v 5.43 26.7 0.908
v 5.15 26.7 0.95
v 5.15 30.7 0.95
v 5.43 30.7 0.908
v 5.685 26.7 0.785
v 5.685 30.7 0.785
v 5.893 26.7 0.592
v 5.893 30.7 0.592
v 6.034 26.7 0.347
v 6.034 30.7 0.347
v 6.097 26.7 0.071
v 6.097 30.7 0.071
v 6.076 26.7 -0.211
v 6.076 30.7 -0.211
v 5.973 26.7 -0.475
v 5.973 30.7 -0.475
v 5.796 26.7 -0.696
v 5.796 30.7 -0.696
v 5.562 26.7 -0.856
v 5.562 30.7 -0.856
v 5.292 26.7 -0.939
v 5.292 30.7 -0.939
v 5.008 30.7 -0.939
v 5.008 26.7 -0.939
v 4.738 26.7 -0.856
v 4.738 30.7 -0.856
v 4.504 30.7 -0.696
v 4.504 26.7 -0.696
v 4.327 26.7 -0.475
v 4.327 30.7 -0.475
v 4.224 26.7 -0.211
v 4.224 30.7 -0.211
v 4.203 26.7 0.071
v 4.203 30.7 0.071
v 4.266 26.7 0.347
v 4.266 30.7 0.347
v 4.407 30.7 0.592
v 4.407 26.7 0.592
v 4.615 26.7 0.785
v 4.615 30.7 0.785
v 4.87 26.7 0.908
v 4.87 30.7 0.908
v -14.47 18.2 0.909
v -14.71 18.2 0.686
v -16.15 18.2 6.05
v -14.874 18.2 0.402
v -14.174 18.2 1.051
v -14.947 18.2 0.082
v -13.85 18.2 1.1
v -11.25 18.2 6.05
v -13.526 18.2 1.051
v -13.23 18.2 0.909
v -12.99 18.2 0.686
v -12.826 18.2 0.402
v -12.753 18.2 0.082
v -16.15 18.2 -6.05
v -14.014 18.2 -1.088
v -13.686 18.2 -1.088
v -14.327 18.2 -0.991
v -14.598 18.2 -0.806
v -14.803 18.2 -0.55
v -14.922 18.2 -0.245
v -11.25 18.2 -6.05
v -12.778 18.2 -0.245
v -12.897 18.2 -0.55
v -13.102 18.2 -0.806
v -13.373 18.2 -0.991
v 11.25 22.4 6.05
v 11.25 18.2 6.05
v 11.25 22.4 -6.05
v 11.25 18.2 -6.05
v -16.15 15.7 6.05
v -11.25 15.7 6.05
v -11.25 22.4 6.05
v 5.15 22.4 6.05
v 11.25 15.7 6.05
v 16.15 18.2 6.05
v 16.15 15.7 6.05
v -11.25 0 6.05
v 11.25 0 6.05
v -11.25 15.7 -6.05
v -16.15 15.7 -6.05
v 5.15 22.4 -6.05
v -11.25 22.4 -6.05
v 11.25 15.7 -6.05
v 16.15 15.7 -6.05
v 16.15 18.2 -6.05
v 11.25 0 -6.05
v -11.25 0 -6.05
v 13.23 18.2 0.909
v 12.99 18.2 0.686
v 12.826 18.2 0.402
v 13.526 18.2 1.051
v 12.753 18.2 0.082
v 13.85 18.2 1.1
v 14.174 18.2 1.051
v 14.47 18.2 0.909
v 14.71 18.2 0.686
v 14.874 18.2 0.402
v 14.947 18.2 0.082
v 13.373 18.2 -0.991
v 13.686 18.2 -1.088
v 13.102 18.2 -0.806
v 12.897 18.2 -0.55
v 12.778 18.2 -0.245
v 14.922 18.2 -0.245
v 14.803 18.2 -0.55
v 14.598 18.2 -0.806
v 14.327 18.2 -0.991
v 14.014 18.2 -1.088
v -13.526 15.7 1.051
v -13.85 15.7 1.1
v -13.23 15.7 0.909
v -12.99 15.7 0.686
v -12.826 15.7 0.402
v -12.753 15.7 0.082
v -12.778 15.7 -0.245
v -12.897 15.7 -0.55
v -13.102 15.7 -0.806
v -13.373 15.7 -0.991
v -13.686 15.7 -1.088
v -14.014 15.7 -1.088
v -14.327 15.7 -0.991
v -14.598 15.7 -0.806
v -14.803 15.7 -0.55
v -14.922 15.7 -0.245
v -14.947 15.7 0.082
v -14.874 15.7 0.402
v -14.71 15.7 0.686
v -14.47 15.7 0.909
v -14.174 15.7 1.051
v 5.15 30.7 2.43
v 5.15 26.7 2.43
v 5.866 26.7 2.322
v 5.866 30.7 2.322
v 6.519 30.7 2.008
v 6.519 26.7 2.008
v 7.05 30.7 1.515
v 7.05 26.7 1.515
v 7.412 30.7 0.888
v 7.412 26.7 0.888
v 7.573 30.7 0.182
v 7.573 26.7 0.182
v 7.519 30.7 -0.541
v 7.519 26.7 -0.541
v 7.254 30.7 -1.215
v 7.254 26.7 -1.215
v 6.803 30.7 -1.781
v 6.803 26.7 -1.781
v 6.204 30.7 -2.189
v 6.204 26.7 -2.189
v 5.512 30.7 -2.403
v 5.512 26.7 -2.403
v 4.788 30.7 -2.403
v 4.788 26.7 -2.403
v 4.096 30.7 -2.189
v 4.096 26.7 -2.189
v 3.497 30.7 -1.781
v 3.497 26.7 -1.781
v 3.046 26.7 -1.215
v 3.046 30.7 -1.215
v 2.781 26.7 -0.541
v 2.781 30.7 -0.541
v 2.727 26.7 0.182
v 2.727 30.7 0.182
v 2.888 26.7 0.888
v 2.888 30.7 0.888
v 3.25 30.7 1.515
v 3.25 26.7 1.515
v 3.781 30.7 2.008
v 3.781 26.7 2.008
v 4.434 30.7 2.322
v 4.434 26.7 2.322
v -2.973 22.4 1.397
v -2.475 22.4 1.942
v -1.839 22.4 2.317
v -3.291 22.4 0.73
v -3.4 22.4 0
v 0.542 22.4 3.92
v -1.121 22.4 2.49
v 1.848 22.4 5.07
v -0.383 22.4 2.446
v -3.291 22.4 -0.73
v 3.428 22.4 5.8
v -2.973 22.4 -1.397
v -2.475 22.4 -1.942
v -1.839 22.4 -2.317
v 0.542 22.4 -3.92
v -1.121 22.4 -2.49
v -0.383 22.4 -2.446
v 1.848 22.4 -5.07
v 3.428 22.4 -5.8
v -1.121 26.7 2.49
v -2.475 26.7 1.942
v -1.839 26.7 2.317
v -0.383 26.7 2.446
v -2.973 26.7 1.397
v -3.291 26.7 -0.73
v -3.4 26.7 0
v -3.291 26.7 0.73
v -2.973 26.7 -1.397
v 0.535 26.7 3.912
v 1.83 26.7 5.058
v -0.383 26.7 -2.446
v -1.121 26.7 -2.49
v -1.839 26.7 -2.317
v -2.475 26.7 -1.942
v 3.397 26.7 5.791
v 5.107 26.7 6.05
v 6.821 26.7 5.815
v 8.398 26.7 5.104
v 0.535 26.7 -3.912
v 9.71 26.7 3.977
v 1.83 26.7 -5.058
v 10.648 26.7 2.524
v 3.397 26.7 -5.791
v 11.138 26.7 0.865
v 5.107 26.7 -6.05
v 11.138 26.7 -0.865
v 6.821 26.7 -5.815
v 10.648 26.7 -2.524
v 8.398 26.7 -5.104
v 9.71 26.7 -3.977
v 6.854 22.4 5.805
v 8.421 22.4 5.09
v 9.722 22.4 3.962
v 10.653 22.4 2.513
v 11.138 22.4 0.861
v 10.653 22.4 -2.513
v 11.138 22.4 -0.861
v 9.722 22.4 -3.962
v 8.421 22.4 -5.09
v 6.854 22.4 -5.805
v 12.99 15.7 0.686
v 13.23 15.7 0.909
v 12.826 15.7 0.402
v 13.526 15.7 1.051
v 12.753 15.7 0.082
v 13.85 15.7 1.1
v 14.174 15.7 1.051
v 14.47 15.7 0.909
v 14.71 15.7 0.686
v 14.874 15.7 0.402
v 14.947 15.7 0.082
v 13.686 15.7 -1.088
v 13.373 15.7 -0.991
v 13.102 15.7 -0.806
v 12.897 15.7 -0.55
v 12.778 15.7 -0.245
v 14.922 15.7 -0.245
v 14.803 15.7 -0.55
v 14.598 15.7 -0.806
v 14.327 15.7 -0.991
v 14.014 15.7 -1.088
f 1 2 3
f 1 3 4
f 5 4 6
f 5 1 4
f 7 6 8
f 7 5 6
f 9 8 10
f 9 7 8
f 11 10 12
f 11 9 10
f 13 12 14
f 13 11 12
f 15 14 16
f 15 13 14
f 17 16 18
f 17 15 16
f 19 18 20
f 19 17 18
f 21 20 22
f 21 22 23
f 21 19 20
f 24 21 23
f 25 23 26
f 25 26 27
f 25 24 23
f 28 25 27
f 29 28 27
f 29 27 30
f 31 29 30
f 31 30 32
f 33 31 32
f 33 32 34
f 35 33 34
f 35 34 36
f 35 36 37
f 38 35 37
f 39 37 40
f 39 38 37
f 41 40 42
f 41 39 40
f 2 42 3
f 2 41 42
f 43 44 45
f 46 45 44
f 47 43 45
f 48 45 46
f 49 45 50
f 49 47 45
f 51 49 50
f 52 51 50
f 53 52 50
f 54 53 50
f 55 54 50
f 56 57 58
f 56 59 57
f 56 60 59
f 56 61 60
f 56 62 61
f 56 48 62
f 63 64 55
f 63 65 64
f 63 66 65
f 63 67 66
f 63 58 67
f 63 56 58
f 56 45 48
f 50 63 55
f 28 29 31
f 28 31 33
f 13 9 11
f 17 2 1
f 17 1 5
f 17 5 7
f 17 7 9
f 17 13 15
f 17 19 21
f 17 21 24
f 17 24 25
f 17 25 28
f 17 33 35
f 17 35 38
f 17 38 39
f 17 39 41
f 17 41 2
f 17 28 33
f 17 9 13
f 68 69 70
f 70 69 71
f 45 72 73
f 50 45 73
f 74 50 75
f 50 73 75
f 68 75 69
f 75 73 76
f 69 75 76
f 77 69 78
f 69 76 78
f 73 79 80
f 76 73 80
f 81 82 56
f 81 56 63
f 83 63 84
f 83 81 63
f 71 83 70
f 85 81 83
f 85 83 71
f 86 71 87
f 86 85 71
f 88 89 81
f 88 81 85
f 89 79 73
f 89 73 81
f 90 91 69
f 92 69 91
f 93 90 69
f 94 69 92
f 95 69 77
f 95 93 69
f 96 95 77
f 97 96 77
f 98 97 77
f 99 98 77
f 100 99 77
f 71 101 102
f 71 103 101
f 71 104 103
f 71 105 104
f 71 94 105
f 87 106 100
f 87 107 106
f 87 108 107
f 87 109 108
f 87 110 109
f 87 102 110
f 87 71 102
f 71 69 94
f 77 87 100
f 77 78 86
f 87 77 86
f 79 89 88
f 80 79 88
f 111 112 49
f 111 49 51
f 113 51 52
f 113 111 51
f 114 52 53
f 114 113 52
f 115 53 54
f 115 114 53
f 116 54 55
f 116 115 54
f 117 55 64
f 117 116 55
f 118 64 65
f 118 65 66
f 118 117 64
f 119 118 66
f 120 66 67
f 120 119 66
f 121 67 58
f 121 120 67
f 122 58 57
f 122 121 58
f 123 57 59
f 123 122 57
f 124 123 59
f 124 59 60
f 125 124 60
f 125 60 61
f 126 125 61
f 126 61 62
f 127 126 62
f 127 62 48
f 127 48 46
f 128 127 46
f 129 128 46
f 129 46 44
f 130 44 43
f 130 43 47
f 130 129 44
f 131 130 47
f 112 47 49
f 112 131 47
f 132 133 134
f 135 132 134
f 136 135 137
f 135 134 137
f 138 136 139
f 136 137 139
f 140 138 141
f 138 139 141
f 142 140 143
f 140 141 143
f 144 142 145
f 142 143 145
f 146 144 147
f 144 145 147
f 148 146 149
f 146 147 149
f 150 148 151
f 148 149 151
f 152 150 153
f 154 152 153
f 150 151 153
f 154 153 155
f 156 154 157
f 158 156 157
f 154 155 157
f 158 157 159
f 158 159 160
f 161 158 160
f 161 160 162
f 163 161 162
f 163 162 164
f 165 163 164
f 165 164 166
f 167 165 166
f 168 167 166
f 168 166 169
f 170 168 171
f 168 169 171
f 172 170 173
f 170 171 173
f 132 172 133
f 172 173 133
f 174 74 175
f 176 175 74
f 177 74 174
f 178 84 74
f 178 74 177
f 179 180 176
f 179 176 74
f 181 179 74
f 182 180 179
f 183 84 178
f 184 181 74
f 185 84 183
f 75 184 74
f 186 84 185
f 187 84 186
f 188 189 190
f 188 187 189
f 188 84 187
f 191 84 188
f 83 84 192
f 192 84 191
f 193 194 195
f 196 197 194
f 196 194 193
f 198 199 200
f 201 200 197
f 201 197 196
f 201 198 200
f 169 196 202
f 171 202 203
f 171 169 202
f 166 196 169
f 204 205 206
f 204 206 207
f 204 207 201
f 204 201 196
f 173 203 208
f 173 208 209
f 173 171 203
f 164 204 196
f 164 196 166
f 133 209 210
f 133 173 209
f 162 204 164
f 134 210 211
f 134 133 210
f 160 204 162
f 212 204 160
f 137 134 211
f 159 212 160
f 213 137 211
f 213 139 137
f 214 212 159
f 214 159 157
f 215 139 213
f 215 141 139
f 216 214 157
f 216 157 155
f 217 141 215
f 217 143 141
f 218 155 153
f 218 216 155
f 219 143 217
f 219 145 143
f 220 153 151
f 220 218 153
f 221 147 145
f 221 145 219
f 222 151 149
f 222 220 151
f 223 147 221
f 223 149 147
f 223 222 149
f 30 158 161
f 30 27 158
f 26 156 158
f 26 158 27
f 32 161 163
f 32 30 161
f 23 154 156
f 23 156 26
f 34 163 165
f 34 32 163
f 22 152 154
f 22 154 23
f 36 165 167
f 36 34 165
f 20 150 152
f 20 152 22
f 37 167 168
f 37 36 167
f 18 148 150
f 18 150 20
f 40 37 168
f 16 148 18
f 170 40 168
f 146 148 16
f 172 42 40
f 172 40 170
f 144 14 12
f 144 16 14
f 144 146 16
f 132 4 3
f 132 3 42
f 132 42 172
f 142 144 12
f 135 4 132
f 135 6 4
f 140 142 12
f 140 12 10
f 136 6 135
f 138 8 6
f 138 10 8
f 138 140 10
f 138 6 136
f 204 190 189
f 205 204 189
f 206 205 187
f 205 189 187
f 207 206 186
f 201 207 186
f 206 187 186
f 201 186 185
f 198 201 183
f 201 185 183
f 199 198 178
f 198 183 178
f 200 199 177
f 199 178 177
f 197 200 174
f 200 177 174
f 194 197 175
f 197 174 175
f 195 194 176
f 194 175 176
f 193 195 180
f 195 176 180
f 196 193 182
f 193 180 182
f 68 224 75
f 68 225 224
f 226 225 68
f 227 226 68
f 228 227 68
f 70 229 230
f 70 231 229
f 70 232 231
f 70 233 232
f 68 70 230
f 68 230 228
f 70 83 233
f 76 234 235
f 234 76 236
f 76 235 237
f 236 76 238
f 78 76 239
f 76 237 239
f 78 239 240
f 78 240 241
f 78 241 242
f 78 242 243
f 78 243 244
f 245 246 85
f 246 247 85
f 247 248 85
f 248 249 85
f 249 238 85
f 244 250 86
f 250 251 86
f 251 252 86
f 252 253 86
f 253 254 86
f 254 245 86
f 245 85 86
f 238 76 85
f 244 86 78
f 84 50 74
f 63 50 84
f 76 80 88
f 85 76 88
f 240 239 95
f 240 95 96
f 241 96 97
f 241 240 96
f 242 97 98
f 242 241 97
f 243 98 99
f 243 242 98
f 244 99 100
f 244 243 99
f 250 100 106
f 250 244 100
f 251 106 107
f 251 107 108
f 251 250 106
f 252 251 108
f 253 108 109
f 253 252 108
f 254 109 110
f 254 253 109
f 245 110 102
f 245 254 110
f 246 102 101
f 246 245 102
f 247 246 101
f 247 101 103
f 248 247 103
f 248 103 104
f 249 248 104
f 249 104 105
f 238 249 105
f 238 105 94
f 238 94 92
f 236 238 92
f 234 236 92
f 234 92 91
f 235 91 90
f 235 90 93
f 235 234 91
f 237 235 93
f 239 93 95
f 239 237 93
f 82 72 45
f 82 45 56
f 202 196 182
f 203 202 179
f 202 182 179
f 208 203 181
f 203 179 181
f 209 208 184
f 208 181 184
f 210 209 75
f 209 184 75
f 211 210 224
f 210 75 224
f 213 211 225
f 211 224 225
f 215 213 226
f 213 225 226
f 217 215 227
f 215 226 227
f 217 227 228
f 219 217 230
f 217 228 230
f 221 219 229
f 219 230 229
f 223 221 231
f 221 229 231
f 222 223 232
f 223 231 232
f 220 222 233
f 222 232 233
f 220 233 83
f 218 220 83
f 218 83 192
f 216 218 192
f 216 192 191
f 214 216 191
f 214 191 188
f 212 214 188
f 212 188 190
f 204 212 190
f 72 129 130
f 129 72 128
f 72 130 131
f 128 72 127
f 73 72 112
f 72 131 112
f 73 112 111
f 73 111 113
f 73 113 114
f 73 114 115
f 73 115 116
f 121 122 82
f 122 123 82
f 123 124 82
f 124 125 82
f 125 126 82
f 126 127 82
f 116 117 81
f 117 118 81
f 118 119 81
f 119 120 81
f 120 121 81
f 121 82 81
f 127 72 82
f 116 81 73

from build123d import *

# Parameters (mm, degrees)
SKETCH2_W           = 22.5
SKETCH2_H           = 12.1
BOSS_EXTRUDE1_DEPTH = 15.7
SKETCH3_W           = 32.3
SKETCH3_H           = 12.1
SKETCH3_R           = 1.1
BOSS_EXTRUDE2_DEPTH = 2.5
SKETCH4_W           = 22.5
SKETCH4_H           = 12.1
BOSS_EXTRUDE3_DEPTH = 4.2
BOSS_EXTRUDE4_DEPTH = 4.3
SKETCH6_R           = 2.43
SKETCH6_R_2         = 0.95
BOSS_EXTRUDE5_DEPTH = 4


with BuildPart() as part:
    # Sketch2 → Boss-Extrude1 (new body)
    with BuildSketch(Plane(origin=(0, 0, 0), x_dir=(1, 0, 0), z_dir=(0, 1, 0))):
        Rectangle(SKETCH2_W, SKETCH2_H)
    extrude(amount=BOSS_EXTRUDE1_DEPTH)

    # Sketch3 → Boss-Extrude2 (add)
    with BuildSketch(Plane(origin=(0, 15.7, 0), x_dir=(1, 0, 0), z_dir=(0, 1, 0))):
        Rectangle(SKETCH3_W, SKETCH3_H)
        with Locations(Location((-13.85, 0, 0), (0, 0, 270))):
            Circle(SKETCH3_R, mode=Mode.SUBTRACT)
        with Locations(Location((13.85, 0, 0), (0, 0, 270))):
            Circle(SKETCH3_R, mode=Mode.SUBTRACT)
    extrude(amount=BOSS_EXTRUDE2_DEPTH)

    # Sketch4 → Boss-Extrude3 (add)
    with BuildSketch(Plane(origin=(0, 18.2, 0), x_dir=(1, 0, 0), z_dir=(0, 1, 0))):
        Rectangle(SKETCH4_W, SKETCH4_H)
    extrude(amount=BOSS_EXTRUDE3_DEPTH)

    # Sketch5 → Boss-Extrude4 (add)
    with BuildSketch(Plane(origin=(0, 22.4, 0), x_dir=(1, 0, 0), z_dir=(0, 1, 0))):
        with BuildLine():
            ThreePointArc((-0.383471074, -2.446057618), (11.2, 0), (-0.383471074, 2.446057618))
            ThreePointArc((-0.383471074, 2.446057618), (-3.4, 0), (-0.383471074, -2.446057618))
        make_face()
    extrude(amount=BOSS_EXTRUDE4_DEPTH)

    # Sketch6 → Boss-Extrude5 (add)
    with BuildSketch(Plane(origin=(0, 26.7, 0), x_dir=(1, 0, 0), z_dir=(0, 1, 0))):
        with Locations(Location((5.15, 0, 0), (0, 0, 270))):
            Circle(SKETCH6_R)
        with Locations(Location((5.15, 0, 0), (0, 0, 270))):
            Circle(SKETCH6_R_2, mode=Mode.SUBTRACT)
    extrude(amount=BOSS_EXTRUDE5_DEPTH)


solid = part.part
